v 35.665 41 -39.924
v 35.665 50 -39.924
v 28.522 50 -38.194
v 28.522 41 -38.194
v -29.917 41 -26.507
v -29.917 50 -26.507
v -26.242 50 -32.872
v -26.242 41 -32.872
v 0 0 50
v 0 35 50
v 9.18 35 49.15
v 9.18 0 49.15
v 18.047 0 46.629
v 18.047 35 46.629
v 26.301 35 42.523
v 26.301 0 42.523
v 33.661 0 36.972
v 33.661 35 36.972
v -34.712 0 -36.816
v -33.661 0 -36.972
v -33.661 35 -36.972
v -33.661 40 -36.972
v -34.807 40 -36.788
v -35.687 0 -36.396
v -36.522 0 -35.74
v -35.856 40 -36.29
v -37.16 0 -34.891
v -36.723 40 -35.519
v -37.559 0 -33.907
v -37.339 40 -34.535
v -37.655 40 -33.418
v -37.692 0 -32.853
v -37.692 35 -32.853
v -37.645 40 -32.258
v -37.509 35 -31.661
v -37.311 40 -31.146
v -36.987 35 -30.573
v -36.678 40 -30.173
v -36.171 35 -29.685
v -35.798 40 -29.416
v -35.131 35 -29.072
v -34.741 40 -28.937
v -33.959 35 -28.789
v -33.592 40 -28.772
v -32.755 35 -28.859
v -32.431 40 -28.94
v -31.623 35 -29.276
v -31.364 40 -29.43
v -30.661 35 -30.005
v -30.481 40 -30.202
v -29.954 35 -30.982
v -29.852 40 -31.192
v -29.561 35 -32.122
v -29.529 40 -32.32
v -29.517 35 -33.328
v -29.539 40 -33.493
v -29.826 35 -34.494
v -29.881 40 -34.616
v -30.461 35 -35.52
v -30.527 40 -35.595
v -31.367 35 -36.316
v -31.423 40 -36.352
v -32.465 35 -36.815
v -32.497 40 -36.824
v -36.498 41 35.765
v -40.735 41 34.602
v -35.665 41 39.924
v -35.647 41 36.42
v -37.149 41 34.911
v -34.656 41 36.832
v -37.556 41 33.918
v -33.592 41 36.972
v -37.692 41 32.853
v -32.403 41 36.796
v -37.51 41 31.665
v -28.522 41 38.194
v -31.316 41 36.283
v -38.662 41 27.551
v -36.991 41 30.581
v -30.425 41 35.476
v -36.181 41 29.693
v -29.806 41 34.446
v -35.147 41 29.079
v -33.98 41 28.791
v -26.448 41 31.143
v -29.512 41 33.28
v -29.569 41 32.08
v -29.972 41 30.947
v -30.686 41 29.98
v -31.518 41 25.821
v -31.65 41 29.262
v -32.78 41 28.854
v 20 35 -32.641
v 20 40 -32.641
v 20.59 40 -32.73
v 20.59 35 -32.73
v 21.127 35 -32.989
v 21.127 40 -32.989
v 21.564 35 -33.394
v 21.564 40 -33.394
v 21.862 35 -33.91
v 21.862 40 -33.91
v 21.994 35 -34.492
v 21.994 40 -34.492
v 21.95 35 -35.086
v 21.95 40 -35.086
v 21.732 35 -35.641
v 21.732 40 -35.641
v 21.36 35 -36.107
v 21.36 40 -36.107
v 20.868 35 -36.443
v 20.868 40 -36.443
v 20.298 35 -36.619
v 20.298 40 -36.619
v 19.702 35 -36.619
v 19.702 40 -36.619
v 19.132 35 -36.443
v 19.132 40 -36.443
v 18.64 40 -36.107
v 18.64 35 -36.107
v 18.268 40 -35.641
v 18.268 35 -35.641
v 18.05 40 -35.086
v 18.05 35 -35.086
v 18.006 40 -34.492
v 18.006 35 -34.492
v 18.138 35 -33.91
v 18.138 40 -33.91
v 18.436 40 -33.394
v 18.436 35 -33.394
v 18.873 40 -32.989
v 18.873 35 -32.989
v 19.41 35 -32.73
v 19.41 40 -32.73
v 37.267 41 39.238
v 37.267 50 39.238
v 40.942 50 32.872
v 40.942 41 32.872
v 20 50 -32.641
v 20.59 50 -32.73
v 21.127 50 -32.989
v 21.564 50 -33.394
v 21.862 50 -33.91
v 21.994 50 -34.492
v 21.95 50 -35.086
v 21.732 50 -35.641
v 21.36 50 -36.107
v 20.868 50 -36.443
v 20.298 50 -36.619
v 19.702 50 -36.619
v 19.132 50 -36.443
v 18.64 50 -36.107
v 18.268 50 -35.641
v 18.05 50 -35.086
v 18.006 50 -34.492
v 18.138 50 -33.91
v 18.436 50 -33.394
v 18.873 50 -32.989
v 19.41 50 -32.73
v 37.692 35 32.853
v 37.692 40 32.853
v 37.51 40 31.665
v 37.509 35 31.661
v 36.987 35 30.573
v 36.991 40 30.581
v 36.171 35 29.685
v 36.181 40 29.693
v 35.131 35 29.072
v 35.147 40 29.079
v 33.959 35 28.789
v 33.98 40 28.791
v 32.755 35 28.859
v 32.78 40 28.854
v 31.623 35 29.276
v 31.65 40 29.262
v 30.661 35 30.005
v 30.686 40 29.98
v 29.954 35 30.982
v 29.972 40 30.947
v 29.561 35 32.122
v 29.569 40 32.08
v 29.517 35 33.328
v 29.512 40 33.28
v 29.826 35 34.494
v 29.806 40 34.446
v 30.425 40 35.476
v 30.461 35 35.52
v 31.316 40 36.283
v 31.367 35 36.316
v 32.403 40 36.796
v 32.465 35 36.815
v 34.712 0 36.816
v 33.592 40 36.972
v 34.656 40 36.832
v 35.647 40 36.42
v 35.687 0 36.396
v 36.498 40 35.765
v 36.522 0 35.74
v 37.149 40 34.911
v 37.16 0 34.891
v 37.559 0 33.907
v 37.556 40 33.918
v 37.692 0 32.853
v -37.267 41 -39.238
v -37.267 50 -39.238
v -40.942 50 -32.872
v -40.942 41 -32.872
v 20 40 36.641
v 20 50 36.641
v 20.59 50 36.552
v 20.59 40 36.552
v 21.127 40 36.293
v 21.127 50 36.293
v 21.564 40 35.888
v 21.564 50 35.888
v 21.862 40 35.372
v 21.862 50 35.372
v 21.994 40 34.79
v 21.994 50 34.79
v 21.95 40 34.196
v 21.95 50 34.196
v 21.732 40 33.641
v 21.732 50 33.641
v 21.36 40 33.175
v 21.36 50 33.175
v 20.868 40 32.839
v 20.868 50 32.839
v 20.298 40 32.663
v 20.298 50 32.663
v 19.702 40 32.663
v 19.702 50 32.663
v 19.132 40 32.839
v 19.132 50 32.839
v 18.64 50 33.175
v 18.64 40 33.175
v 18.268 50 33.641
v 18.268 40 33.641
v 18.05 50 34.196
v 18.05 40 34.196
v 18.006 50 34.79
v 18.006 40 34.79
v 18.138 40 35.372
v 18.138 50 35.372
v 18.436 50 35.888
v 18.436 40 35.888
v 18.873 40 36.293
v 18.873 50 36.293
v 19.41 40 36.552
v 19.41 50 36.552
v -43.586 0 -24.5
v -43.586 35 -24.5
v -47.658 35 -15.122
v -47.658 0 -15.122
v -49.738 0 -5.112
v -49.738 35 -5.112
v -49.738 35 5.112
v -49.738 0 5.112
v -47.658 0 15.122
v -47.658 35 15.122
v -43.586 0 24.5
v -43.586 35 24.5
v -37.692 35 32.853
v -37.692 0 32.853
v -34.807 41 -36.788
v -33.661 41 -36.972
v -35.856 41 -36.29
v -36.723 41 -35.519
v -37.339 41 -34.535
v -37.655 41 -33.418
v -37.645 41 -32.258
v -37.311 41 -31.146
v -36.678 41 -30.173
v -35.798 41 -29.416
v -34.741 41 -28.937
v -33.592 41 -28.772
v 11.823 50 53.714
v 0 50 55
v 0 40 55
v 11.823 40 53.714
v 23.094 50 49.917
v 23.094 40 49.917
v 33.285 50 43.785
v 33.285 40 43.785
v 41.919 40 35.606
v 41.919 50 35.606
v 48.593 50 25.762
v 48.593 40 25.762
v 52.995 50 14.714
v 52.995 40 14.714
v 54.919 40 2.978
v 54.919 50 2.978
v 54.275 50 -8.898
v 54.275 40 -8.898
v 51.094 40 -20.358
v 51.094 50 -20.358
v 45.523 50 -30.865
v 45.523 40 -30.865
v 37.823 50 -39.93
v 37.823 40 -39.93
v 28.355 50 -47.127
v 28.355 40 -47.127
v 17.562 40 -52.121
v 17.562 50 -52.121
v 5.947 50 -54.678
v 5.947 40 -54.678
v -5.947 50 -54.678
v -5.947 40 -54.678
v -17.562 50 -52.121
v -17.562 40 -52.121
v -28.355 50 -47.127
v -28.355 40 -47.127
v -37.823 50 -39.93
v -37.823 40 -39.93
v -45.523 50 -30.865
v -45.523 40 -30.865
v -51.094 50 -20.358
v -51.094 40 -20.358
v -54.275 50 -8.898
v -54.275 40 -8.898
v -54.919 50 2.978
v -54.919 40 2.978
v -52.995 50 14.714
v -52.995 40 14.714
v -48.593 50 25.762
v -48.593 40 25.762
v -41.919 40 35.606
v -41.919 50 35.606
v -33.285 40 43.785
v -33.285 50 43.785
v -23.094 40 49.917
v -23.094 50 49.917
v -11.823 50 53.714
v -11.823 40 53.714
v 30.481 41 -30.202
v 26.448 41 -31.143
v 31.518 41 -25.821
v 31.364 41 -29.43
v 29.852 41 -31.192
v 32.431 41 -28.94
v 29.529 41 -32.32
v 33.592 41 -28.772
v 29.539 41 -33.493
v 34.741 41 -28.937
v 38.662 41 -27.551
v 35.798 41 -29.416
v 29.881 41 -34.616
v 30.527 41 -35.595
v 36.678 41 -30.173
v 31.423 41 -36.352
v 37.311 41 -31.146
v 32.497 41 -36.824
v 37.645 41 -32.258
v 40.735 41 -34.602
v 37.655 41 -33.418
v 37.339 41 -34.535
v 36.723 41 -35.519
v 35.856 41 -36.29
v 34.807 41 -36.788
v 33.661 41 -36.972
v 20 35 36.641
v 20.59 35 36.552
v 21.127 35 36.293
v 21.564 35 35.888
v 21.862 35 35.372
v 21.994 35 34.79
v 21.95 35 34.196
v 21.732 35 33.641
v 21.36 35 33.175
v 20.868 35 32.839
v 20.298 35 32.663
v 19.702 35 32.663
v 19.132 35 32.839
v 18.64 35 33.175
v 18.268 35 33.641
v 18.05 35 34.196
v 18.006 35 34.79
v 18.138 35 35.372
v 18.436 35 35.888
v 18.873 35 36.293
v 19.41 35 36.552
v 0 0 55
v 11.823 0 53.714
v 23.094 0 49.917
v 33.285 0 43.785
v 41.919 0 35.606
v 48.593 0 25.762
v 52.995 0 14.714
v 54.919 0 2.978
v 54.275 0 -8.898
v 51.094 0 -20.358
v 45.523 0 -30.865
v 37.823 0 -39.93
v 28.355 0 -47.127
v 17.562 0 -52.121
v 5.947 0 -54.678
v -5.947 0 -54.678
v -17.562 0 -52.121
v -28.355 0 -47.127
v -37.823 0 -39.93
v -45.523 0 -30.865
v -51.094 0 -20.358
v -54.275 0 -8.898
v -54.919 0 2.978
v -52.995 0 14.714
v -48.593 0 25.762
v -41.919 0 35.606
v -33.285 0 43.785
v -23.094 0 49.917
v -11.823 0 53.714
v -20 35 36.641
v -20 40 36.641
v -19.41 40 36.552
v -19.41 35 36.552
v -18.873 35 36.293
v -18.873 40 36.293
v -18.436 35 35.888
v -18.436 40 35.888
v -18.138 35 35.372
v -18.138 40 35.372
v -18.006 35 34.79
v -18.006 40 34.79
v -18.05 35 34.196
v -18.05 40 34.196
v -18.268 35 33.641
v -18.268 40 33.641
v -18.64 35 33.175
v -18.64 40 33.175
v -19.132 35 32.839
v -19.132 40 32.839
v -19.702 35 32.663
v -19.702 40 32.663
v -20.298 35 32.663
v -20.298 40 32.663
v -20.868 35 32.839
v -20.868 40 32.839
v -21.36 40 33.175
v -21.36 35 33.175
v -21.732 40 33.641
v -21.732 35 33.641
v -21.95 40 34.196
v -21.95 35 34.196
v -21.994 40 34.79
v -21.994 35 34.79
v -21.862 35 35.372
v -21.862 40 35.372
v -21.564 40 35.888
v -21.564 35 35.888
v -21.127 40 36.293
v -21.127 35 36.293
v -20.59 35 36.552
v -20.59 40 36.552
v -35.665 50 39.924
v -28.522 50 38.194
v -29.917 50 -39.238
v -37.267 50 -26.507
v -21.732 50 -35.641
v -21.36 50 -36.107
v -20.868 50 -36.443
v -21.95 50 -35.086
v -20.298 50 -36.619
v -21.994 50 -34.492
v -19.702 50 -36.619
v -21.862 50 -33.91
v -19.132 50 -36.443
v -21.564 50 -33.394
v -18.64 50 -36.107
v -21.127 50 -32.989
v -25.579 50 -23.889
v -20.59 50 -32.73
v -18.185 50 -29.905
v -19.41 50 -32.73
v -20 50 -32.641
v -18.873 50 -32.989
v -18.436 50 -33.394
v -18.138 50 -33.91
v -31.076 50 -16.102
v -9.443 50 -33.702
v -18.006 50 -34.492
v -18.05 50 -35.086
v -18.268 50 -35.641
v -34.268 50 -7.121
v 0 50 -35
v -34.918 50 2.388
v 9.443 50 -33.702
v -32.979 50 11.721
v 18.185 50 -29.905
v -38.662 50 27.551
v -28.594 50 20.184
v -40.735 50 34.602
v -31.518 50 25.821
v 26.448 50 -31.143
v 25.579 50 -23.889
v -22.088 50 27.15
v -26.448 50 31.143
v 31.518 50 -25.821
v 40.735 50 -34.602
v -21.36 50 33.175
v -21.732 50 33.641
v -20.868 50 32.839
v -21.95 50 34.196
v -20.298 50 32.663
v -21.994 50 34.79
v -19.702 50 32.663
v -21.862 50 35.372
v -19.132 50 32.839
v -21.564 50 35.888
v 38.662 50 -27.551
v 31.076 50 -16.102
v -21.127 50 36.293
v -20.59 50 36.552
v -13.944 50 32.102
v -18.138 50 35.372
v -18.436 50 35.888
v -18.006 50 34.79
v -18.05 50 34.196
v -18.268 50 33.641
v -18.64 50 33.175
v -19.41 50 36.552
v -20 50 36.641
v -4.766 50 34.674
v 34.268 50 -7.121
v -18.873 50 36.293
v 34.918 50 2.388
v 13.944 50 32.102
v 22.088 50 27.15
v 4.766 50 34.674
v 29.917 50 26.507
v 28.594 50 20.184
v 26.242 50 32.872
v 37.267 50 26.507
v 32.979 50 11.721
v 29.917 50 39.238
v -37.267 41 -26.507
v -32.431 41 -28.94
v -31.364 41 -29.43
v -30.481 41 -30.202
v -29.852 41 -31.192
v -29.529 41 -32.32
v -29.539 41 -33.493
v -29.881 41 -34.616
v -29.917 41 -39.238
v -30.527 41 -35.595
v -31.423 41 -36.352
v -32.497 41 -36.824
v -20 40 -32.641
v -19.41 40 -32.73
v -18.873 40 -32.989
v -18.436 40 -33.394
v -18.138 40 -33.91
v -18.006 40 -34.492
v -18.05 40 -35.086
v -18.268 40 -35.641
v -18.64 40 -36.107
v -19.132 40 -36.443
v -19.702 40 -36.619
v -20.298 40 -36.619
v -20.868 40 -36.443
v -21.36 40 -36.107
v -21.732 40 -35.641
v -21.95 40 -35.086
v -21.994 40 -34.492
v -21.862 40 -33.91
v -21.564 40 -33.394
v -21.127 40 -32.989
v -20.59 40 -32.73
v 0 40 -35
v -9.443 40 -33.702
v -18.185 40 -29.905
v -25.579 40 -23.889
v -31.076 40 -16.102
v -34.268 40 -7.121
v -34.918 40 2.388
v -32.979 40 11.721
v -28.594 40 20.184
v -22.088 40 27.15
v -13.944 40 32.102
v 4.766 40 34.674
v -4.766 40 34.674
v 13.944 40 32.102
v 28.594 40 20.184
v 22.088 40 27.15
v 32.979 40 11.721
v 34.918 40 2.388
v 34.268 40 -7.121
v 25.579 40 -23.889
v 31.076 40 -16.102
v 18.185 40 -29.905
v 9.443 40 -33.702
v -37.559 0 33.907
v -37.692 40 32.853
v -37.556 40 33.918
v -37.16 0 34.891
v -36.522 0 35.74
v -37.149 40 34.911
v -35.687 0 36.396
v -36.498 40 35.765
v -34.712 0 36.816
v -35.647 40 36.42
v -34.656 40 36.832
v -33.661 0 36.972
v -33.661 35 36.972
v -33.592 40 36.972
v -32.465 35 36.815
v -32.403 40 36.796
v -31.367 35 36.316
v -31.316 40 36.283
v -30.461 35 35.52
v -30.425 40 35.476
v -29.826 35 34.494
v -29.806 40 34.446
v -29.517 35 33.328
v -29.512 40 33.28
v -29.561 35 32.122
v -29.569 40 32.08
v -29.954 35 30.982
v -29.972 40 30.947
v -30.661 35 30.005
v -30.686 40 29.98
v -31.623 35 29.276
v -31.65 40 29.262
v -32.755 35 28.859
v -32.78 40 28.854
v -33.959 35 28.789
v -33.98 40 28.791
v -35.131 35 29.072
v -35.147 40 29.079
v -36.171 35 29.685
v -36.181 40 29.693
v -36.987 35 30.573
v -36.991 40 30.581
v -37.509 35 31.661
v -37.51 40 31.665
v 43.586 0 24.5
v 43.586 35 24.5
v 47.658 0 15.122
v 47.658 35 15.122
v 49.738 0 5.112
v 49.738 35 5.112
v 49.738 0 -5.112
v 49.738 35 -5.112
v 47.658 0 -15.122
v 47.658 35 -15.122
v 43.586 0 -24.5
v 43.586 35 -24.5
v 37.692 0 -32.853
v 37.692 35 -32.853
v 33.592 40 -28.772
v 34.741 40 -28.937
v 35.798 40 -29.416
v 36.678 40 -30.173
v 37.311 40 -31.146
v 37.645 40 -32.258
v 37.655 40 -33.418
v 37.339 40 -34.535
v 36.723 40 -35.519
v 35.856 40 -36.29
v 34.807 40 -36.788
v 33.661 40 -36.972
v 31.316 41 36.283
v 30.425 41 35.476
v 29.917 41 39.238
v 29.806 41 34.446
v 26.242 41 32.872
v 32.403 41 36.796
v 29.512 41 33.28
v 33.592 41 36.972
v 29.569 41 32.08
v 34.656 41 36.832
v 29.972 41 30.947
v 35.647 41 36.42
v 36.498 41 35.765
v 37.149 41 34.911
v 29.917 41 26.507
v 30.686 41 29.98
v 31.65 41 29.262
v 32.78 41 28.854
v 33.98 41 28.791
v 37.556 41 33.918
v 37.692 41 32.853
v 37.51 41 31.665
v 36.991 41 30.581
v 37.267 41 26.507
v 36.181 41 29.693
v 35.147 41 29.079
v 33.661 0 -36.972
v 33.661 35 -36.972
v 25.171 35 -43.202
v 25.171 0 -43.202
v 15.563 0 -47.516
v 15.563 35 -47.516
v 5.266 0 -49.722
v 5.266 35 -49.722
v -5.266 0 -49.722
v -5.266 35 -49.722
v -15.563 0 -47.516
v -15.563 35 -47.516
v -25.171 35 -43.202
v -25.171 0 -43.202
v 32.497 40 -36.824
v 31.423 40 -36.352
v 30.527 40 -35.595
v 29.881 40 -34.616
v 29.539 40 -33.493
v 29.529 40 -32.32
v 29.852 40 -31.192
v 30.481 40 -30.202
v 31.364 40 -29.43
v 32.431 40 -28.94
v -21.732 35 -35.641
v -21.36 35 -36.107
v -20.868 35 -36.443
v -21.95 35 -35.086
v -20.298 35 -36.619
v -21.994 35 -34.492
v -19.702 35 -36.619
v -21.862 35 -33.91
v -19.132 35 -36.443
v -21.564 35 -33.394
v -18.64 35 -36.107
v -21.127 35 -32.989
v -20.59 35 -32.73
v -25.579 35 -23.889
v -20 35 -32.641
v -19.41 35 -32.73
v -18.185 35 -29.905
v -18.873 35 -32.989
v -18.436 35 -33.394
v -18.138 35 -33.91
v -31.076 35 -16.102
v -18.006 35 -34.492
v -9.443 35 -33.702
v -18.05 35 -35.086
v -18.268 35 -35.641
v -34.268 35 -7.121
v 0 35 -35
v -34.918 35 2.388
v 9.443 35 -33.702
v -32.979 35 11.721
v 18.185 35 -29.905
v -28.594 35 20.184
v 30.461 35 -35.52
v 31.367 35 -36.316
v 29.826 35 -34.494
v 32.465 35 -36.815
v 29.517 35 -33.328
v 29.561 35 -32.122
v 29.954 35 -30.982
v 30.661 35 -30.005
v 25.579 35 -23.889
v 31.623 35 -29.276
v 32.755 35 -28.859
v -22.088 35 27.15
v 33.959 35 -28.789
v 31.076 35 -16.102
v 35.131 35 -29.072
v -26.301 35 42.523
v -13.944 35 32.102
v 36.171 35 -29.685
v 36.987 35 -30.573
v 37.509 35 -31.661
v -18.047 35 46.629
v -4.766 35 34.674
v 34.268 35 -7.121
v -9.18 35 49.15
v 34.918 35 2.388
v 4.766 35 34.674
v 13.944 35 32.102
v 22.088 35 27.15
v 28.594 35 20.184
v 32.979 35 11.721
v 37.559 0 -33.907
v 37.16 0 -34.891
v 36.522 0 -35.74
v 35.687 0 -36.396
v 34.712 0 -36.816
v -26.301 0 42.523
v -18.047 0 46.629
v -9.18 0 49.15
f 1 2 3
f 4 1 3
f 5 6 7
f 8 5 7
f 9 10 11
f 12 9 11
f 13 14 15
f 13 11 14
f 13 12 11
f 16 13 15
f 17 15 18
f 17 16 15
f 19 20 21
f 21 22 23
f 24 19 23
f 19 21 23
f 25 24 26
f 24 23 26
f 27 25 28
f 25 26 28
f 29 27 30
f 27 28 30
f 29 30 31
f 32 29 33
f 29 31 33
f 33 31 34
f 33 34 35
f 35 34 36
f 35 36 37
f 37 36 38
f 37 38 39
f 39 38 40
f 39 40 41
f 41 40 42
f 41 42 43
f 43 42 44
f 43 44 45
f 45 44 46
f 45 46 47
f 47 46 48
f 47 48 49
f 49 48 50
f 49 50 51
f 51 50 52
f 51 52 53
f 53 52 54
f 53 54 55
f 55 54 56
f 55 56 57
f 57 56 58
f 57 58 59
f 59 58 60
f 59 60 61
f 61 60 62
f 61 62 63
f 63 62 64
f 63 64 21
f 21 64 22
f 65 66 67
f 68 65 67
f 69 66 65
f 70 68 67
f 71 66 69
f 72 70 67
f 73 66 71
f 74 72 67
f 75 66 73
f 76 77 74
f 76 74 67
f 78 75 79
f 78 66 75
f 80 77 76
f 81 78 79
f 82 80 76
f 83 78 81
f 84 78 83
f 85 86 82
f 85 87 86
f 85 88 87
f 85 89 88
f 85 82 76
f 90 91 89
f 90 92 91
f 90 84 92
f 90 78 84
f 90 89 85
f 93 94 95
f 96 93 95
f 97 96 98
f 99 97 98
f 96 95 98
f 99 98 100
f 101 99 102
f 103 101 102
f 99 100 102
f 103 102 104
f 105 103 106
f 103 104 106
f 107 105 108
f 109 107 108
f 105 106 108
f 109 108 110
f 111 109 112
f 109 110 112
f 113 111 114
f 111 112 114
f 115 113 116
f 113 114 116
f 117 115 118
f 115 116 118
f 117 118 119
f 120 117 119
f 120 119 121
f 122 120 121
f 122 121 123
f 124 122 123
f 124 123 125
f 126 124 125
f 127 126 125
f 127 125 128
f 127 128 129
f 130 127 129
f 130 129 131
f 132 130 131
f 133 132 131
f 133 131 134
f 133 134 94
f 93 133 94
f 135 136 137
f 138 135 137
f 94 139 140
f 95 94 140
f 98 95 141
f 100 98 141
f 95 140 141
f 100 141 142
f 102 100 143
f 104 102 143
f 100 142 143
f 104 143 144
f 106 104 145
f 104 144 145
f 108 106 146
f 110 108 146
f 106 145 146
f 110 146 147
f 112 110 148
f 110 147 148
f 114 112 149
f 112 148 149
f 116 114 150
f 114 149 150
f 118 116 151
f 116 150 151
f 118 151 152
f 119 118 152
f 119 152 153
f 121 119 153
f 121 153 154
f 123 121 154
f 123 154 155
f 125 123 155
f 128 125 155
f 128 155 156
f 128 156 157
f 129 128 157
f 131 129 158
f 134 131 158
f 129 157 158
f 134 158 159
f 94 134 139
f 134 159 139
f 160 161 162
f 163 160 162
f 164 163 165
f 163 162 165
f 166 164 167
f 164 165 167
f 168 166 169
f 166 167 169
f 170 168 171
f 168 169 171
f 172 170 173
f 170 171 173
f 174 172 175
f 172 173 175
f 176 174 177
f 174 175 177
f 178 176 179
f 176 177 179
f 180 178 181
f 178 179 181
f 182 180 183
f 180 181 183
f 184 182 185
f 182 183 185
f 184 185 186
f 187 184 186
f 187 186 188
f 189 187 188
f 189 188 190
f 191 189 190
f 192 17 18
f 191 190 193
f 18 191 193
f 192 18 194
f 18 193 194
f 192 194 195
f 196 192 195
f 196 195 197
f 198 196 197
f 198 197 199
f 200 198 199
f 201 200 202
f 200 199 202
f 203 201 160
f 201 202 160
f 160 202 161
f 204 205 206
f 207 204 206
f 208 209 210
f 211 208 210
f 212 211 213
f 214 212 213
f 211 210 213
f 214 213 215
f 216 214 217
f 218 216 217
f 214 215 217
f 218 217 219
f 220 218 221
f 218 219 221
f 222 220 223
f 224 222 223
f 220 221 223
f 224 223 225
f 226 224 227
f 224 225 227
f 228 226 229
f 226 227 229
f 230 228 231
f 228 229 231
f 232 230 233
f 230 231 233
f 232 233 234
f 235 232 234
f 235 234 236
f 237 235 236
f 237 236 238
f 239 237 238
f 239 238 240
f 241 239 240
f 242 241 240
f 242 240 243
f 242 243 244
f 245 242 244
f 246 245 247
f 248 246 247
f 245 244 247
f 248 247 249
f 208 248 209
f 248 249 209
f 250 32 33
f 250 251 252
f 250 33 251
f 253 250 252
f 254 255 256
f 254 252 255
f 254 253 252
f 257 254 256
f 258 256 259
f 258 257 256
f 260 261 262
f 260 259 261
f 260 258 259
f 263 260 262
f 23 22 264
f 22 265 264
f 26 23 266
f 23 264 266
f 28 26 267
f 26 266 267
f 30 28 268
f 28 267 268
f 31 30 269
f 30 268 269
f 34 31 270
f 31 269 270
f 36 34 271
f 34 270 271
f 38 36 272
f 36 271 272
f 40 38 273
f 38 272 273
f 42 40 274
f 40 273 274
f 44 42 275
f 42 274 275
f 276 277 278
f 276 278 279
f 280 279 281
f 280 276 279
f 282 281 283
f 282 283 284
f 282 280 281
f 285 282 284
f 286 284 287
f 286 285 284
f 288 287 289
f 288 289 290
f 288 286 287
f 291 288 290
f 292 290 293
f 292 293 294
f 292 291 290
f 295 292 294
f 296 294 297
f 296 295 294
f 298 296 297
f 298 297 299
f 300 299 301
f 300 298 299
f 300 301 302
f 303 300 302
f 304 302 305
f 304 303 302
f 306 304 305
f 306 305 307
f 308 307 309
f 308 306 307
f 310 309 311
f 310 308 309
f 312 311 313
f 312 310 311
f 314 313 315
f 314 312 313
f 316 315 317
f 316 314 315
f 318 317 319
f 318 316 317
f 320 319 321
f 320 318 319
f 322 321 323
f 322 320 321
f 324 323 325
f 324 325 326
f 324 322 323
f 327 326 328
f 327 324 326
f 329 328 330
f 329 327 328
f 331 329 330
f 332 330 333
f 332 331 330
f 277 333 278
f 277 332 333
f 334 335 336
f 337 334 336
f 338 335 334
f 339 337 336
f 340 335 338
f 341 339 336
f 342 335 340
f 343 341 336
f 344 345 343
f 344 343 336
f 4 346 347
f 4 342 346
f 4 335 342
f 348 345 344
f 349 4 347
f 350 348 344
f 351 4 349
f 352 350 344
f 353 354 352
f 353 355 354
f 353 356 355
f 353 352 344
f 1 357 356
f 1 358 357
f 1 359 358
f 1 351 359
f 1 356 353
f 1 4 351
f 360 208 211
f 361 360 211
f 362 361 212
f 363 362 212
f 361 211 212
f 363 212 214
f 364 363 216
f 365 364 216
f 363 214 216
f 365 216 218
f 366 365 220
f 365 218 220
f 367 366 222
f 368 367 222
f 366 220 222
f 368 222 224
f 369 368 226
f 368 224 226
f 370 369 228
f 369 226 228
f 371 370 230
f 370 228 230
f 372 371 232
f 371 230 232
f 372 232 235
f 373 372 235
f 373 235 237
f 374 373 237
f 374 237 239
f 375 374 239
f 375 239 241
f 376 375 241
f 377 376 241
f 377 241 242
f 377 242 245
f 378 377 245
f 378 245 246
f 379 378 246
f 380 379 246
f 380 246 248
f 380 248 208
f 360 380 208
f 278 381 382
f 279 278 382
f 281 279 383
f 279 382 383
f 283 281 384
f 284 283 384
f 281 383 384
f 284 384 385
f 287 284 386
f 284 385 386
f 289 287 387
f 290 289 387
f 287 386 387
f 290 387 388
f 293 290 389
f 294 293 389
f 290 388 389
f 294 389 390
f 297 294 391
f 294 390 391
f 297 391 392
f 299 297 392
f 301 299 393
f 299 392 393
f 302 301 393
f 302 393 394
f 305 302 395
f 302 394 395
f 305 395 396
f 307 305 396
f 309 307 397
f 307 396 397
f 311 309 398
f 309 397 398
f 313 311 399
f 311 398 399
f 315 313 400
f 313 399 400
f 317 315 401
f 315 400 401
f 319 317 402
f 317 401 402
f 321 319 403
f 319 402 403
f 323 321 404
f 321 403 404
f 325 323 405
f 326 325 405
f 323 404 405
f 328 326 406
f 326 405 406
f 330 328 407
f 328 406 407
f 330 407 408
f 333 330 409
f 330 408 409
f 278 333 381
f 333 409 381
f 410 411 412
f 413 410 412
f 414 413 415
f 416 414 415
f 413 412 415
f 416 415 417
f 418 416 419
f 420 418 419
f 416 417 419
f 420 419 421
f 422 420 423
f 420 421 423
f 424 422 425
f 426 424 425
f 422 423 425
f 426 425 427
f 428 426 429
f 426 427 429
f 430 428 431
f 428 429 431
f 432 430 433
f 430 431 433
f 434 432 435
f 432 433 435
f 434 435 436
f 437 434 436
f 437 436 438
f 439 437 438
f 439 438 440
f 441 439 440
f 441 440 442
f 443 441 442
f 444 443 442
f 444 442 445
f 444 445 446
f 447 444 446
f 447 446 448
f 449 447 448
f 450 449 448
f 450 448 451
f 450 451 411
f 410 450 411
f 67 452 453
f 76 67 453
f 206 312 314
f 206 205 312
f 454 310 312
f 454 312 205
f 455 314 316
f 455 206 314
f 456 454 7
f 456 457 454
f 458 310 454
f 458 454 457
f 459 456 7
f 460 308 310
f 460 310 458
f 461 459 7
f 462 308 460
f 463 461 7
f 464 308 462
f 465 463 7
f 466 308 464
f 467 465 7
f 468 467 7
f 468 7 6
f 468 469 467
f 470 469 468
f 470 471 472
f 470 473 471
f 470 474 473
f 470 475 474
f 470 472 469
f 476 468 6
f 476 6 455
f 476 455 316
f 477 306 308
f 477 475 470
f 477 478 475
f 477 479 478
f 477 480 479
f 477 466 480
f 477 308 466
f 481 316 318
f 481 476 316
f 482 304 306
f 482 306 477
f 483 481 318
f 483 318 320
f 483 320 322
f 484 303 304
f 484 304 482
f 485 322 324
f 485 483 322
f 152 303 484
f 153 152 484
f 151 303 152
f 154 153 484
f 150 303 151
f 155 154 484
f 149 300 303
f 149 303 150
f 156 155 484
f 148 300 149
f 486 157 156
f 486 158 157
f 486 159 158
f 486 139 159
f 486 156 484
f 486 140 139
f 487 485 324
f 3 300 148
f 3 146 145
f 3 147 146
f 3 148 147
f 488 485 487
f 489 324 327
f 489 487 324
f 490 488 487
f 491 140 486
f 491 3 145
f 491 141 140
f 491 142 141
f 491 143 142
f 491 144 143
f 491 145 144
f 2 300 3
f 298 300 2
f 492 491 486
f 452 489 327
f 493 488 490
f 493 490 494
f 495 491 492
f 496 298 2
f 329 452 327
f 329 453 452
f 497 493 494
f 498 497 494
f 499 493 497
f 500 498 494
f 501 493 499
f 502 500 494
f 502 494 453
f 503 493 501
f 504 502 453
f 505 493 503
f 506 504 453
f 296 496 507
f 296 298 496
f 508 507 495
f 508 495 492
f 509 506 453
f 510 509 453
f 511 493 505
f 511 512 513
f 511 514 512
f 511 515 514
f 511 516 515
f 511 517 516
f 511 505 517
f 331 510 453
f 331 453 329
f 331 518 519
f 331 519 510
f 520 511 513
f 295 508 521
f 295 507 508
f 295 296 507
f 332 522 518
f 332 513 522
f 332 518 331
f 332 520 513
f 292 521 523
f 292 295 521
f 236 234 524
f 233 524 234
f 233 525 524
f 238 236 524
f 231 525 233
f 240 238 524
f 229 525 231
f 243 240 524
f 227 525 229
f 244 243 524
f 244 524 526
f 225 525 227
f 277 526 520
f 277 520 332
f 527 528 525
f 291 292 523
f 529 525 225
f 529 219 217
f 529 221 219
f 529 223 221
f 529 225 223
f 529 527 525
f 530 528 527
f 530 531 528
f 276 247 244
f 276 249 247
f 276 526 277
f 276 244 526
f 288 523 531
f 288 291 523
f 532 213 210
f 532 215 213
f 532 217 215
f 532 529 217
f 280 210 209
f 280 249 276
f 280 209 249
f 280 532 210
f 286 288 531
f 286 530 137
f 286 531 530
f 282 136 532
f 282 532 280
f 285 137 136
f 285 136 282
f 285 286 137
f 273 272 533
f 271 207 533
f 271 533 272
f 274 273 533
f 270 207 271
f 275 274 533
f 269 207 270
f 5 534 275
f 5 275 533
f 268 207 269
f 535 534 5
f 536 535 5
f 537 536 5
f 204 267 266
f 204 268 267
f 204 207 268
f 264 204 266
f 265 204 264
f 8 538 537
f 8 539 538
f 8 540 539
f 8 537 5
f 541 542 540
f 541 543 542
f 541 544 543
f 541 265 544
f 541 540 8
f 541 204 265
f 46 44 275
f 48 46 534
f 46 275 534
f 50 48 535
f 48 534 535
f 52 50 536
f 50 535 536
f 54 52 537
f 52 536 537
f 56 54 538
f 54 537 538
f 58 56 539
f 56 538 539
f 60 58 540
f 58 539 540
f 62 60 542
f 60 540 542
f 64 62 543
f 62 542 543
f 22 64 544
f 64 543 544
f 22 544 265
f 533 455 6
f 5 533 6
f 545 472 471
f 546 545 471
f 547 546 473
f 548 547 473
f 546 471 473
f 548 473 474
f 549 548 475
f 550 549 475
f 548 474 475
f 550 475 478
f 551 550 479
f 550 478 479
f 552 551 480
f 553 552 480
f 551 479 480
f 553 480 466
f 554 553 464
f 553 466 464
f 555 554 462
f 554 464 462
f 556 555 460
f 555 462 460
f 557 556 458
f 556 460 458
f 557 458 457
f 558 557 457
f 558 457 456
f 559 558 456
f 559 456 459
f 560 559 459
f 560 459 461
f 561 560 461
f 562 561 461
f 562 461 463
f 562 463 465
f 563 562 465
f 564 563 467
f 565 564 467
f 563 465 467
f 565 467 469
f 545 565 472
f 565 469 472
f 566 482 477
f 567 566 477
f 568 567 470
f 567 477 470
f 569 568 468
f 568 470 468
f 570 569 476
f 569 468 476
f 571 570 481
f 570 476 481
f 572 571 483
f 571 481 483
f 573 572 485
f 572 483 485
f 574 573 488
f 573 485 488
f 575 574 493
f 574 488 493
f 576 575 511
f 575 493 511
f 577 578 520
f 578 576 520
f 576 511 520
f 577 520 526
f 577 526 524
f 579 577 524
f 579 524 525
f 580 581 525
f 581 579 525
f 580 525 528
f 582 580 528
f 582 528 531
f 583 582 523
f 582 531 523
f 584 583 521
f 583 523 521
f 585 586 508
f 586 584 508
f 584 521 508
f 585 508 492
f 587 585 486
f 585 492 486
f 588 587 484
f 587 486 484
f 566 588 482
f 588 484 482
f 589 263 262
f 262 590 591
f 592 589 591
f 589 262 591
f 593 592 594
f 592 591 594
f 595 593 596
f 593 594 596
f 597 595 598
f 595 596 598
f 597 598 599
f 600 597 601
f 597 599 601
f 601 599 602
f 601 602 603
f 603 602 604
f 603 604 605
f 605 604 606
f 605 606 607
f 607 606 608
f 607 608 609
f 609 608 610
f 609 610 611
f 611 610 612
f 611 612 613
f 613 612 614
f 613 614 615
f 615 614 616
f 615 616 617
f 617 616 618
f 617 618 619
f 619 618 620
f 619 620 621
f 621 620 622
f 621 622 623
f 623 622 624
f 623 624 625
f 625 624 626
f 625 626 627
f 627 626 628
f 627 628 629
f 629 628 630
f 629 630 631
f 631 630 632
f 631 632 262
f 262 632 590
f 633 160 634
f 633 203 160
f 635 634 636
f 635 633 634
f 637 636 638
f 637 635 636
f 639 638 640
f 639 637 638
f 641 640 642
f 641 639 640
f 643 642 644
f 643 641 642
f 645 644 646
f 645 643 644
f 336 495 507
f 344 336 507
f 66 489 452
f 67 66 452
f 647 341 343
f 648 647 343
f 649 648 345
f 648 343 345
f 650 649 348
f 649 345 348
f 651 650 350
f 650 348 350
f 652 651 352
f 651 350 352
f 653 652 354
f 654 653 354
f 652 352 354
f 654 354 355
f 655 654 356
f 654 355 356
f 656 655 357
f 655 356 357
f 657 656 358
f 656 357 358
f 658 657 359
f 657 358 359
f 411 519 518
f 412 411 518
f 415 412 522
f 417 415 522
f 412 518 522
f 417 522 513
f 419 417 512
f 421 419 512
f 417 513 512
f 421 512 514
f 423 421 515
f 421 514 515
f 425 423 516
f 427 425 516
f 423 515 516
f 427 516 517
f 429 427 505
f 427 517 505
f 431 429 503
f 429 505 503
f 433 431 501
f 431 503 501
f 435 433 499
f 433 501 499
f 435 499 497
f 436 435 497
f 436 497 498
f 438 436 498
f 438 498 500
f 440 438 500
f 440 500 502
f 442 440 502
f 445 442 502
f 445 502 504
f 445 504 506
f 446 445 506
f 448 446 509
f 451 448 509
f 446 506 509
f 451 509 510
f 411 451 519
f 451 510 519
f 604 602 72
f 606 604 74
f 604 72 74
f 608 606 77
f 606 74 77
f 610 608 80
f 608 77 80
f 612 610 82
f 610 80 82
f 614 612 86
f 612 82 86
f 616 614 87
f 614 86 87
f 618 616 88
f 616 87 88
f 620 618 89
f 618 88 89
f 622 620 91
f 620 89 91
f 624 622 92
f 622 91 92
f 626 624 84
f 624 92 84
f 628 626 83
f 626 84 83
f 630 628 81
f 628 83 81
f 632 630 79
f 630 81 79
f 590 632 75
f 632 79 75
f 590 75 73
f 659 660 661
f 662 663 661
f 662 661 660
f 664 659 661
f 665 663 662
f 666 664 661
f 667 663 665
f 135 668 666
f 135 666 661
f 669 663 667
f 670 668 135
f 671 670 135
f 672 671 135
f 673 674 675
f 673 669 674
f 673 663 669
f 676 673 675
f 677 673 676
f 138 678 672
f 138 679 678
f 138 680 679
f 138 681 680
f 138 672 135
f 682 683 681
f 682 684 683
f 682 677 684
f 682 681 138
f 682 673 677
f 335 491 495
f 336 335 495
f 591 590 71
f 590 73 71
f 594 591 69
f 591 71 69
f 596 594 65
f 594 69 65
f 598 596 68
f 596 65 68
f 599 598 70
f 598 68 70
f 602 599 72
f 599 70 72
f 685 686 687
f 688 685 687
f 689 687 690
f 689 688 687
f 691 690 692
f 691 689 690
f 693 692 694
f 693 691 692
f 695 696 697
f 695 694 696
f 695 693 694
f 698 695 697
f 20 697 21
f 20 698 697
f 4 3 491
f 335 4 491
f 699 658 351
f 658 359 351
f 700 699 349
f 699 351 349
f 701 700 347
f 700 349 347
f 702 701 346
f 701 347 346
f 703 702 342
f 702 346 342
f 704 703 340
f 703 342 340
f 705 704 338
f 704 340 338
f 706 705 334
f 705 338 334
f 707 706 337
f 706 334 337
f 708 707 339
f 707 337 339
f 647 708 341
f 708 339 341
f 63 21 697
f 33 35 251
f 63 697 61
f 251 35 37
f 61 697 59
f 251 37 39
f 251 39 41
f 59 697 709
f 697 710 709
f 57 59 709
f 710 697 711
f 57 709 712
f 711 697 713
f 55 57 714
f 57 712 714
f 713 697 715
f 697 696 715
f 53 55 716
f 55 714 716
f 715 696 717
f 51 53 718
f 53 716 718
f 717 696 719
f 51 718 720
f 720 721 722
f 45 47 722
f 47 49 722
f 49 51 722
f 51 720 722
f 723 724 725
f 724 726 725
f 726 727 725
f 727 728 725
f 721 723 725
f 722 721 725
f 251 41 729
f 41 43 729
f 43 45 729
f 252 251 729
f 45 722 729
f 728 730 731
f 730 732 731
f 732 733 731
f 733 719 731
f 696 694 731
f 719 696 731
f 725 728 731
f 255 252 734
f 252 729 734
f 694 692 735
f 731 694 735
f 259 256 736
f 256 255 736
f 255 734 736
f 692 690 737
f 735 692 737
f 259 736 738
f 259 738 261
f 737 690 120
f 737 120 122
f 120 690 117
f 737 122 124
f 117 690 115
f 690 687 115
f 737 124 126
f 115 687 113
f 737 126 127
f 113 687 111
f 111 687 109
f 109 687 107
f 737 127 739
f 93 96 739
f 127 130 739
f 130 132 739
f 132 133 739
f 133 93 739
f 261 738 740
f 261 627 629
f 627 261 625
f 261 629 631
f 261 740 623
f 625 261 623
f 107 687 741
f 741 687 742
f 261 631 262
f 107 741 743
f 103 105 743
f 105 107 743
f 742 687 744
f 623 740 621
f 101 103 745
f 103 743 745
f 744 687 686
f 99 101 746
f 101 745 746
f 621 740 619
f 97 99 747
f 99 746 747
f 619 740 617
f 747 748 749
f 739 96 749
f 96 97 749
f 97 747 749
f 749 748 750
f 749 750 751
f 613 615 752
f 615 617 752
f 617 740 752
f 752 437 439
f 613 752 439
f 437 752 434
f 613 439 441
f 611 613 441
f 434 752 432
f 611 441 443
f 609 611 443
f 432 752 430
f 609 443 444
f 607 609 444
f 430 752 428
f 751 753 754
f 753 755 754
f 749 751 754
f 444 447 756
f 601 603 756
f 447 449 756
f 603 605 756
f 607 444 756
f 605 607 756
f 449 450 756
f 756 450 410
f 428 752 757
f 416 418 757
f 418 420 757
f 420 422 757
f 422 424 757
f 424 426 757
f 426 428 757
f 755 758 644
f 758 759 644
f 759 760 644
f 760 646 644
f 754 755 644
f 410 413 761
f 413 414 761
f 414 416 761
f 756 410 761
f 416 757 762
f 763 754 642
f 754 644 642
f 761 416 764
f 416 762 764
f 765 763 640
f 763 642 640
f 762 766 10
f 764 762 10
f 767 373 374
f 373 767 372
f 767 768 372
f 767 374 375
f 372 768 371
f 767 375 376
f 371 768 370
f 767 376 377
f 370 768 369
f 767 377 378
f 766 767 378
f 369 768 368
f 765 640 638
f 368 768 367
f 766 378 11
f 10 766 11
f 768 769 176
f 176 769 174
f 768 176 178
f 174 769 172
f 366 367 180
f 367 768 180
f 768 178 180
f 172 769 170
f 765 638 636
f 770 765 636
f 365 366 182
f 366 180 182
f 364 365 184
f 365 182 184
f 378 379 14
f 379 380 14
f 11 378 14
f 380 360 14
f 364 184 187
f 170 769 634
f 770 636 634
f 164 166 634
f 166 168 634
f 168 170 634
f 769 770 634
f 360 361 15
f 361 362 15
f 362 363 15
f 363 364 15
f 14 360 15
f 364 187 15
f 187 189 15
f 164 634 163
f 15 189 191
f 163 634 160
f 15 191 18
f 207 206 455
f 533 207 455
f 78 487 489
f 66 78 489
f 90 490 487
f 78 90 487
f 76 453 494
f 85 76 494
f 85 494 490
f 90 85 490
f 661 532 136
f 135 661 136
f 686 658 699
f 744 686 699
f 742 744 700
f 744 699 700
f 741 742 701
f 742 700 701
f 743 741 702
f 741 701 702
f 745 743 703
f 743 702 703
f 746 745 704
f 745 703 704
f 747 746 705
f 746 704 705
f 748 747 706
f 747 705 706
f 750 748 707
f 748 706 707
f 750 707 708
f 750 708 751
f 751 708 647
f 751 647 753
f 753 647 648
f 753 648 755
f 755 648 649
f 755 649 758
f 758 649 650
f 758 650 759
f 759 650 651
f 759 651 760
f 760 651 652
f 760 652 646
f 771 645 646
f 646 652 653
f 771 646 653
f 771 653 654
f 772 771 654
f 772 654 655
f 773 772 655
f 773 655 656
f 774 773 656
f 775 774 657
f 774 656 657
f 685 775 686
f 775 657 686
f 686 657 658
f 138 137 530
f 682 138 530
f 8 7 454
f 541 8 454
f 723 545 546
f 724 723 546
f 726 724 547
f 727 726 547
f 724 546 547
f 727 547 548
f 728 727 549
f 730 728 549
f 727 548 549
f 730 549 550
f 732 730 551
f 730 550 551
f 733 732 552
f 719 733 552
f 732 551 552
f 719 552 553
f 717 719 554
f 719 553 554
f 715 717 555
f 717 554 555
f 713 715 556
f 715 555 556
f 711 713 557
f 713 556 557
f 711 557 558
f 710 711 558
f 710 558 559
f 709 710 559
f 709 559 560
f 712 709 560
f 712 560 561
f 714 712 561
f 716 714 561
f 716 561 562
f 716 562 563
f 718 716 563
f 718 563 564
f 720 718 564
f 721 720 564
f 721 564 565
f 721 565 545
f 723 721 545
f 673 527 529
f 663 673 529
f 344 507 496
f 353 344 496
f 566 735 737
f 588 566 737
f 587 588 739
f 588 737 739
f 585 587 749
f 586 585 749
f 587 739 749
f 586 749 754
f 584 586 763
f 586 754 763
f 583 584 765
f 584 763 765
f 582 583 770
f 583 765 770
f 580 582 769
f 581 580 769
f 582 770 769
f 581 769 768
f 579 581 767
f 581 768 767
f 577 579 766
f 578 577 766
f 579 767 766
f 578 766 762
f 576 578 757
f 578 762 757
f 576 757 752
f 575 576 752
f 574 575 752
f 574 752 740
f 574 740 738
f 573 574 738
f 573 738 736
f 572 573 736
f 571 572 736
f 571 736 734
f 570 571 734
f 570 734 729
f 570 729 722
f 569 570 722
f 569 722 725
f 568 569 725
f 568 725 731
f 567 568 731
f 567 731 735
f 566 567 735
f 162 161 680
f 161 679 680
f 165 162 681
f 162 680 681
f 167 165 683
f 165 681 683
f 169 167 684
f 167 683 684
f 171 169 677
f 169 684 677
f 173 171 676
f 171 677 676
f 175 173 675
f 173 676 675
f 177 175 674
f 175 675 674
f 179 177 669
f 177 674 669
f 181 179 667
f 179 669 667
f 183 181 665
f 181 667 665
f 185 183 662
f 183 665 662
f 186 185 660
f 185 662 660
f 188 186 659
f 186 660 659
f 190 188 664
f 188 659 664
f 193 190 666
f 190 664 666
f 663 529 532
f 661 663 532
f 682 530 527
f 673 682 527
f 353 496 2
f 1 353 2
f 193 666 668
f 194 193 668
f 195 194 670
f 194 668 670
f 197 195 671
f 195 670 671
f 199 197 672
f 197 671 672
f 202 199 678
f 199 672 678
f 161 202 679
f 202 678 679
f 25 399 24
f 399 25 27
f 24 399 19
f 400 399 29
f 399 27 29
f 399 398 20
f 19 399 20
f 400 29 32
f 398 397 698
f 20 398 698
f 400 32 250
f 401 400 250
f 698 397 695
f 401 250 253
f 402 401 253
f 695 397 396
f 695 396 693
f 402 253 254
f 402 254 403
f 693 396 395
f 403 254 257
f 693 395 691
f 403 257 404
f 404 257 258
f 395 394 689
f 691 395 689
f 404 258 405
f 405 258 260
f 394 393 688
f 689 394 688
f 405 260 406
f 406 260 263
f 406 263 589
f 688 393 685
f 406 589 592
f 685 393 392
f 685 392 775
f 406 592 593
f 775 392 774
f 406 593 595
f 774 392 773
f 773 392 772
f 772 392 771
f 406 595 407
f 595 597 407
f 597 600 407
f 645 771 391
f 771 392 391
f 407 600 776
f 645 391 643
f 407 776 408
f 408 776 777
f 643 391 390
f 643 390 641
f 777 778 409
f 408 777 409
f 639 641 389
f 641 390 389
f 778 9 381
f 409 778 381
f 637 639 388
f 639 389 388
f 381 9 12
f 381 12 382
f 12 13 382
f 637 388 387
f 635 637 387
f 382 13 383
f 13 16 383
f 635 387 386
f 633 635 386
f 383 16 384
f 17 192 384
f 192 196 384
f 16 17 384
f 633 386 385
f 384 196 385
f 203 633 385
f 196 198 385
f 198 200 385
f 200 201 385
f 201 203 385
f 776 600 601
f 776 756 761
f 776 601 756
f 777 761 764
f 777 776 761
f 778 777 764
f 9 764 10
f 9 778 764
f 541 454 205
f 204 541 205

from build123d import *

# Parameters (mm, degrees)
SKETCH1_R           = 55
BOSS_EXTRUDE1_DEPTH = 40
SHELL1_T            = -5
SKETCH2_R           = 35
CUT_EXTRUDE1_DEPTH  = 86.293610546
SKETCH3_R           = 2
CUT_EXTRUDE2_DEPTH  = 88.464278423
BOSS_EXTRUDE2_START = 10
SKETCH4_R           = 55
SKETCH4_R_2         = 35
SKETCH4_R_3         = 4.1
SKETCH4_R_4         = 2
BOSS_EXTRUDE2_DEPTH = 10
SKETCH5_R           = 4.1
CUT_EXTRUDE3_DEPTH  = 93.466210045
CUT_EXTRUDE4_DEPTH  = 9


with BuildPart() as part:
    # Sketch1 → Boss-Extrude1 (new body)
    with BuildSketch(Plane(origin=(0, 0, 0), x_dir=(1, 0, 0), z_dir=(0, 1, 0))):
        with Locations(Location((0, 0, 0), (0, 0, 270))):
            Circle(SKETCH1_R)
    extrude(amount=BOSS_EXTRUDE1_DEPTH)

    # Shell1
    shell1_openings = [part.faces().sort_by_distance(p)[0] for p in [
        (0, 0, 0),
    ]]
    offset(amount=SHELL1_T, openings=shell1_openings, kind=Kind.INTERSECTION)

    # Sketch2 → Cut-Extrude1 (cut, through all)
    with BuildSketch(Plane.XZ.offset(-35)):
        with Locations(Location((0, 0, 0), (0, 0, 270))):
            Circle(SKETCH2_R)
    extrude(amount=-CUT_EXTRUDE1_DEPTH, mode=Mode.SUBTRACT)

    # Sketch3 → Cut-Extrude2 (cut, through all)
    with BuildSketch(Plane(origin=(0, 40, 0), x_dir=(1, 0, 0), z_dir=(0, 1, 0))):
        with Locations(Location((-20, -34.641016151, 0), (0, 0, 270))):
            Circle(SKETCH3_R)
        with Locations(Location((-20, 34.641016151, 0), (0, 0, 270))):
            Circle(SKETCH3_R)
        with Locations(Location((20, 34.641016151, 0), (0, 0, 270))):
            Circle(SKETCH3_R)
        with Locations(Location((20, -34.641016151, 0), (0, 0, 270))):
            Circle(SKETCH3_R)
    extrude(amount=-CUT_EXTRUDE2_DEPTH, mode=Mode.SUBTRACT)

    # Sketch4 → Boss-Extrude2 (add)
    with BuildSketch(Plane(origin=(0, 40, 0), x_dir=(1, 0, 0), z_dir=(0, 1, 0)).offset(BOSS_EXTRUDE2_START)):
        with Locations(Location((0, 0, 0), (0, 0, 270))):
            Circle(SKETCH4_R)
        with Locations(Location((0, 0, 0), (0, 0, 90))):
            Circle(SKETCH4_R_2, mode=Mode.SUBTRACT)
        with Locations(Location((-33.591727055, -32.872418126, 0), (0, 0, 270))):
            Circle(SKETCH4_R_3, mode=Mode.SUBTRACT)
        with Locations(Location((-33.591727055, 32.872418126, 0), (0, 0, 270))):
            Circle(SKETCH4_R_3, mode=Mode.SUBTRACT)
        with Locations(Location((33.591727055, 32.872418126, 0), (0, 0, 270))):
            Circle(SKETCH4_R_3, mode=Mode.SUBTRACT)
        with Locations(Location((33.591727055, -32.872418126, 0), (0, 0, 270))):
            Circle(SKETCH4_R_3, mode=Mode.SUBTRACT)
        with Locations(Location((20, 34.641016151, 0), (0, 0, 270))):
            Circle(SKETCH4_R_4, mode=Mode.SUBTRACT)
        with Locations(Location((20, -34.641016151, 0), (0, 0, 270))):
            Circle(SKETCH4_R_4, mode=Mode.SUBTRACT)
        with Locations(Location((-20, -34.641016151, 0), (0, 0, 270))):
            Circle(SKETCH4_R_4, mode=Mode.SUBTRACT)
        with Locations(Location((-20, 34.641016151, 0), (0, 0, 270))):
            Circle(SKETCH4_R_4, mode=Mode.SUBTRACT)
    extrude(amount=-BOSS_EXTRUDE2_DEPTH)

    # Sketch5 → Cut-Extrude3 (cut, through all)
    with BuildSketch(Plane(origin=(0, 50, 0), x_dir=(1, 0, 0), z_dir=(0, 1, 0))):
        with Locations(Location((-33.591727055, -32.872418126, 0), (0, 0, 179.732355429))):
            Circle(SKETCH5_R)
        with Locations(Location((-33.591727055, 32.872418126, 0), (0, 0, 90.972475399))):
            Circle(SKETCH5_R)
        with Locations(Location((33.591727055, 32.872418126, 0), (0, 0, 89.027524601))):
            Circle(SKETCH5_R)
        with Locations(Location((33.591727055, -32.872418126, 0), (0, 0, 0.267644571))):
            Circle(SKETCH5_R)
    extrude(amount=-CUT_EXTRUDE3_DEPTH, mode=Mode.SUBTRACT)

    # Sketch6 → Cut-Extrude4 (cut)
    with BuildSketch(Plane(origin=(0, 50, 0), x_dir=(1, 0, 0), z_dir=(0, 1, 0))):
        Polygon((37.266727055, -26.507131408), (29.916727055, -26.507131408), (26.241727055, -32.872418126), (29.916727055, -39.237704844), (37.266727055, -39.237704844), (40.941727055, -32.872418126), align=None)
        Polygon((-28.521851271, -38.19396485), (-26.448194513, -31.142550265), (-31.518070297, -25.821003541), (-38.661602839, -27.550871402), (-40.735259598, -34.602285987), (-35.665383814, -39.923832711), align=None)
        Polygon((-26.241727055, 32.872418126), (-29.916727055, 39.237704844), (-37.266727055, 39.237704844), (-40.941727055, 32.872418126), (-37.266727055, 26.507131408), (-29.916727055, 26.507131408), align=None)
        Polygon((31.518070297, 25.821003541), (38.661602839, 27.550871402), (40.735259598, 34.602285987), (35.665383814, 39.923832711), (28.521851271, 38.19396485), (26.448194513, 31.142550265), align=None)
    extrude(amount=-CUT_EXTRUDE4_DEPTH, mode=Mode.SUBTRACT)


solid = part.part
